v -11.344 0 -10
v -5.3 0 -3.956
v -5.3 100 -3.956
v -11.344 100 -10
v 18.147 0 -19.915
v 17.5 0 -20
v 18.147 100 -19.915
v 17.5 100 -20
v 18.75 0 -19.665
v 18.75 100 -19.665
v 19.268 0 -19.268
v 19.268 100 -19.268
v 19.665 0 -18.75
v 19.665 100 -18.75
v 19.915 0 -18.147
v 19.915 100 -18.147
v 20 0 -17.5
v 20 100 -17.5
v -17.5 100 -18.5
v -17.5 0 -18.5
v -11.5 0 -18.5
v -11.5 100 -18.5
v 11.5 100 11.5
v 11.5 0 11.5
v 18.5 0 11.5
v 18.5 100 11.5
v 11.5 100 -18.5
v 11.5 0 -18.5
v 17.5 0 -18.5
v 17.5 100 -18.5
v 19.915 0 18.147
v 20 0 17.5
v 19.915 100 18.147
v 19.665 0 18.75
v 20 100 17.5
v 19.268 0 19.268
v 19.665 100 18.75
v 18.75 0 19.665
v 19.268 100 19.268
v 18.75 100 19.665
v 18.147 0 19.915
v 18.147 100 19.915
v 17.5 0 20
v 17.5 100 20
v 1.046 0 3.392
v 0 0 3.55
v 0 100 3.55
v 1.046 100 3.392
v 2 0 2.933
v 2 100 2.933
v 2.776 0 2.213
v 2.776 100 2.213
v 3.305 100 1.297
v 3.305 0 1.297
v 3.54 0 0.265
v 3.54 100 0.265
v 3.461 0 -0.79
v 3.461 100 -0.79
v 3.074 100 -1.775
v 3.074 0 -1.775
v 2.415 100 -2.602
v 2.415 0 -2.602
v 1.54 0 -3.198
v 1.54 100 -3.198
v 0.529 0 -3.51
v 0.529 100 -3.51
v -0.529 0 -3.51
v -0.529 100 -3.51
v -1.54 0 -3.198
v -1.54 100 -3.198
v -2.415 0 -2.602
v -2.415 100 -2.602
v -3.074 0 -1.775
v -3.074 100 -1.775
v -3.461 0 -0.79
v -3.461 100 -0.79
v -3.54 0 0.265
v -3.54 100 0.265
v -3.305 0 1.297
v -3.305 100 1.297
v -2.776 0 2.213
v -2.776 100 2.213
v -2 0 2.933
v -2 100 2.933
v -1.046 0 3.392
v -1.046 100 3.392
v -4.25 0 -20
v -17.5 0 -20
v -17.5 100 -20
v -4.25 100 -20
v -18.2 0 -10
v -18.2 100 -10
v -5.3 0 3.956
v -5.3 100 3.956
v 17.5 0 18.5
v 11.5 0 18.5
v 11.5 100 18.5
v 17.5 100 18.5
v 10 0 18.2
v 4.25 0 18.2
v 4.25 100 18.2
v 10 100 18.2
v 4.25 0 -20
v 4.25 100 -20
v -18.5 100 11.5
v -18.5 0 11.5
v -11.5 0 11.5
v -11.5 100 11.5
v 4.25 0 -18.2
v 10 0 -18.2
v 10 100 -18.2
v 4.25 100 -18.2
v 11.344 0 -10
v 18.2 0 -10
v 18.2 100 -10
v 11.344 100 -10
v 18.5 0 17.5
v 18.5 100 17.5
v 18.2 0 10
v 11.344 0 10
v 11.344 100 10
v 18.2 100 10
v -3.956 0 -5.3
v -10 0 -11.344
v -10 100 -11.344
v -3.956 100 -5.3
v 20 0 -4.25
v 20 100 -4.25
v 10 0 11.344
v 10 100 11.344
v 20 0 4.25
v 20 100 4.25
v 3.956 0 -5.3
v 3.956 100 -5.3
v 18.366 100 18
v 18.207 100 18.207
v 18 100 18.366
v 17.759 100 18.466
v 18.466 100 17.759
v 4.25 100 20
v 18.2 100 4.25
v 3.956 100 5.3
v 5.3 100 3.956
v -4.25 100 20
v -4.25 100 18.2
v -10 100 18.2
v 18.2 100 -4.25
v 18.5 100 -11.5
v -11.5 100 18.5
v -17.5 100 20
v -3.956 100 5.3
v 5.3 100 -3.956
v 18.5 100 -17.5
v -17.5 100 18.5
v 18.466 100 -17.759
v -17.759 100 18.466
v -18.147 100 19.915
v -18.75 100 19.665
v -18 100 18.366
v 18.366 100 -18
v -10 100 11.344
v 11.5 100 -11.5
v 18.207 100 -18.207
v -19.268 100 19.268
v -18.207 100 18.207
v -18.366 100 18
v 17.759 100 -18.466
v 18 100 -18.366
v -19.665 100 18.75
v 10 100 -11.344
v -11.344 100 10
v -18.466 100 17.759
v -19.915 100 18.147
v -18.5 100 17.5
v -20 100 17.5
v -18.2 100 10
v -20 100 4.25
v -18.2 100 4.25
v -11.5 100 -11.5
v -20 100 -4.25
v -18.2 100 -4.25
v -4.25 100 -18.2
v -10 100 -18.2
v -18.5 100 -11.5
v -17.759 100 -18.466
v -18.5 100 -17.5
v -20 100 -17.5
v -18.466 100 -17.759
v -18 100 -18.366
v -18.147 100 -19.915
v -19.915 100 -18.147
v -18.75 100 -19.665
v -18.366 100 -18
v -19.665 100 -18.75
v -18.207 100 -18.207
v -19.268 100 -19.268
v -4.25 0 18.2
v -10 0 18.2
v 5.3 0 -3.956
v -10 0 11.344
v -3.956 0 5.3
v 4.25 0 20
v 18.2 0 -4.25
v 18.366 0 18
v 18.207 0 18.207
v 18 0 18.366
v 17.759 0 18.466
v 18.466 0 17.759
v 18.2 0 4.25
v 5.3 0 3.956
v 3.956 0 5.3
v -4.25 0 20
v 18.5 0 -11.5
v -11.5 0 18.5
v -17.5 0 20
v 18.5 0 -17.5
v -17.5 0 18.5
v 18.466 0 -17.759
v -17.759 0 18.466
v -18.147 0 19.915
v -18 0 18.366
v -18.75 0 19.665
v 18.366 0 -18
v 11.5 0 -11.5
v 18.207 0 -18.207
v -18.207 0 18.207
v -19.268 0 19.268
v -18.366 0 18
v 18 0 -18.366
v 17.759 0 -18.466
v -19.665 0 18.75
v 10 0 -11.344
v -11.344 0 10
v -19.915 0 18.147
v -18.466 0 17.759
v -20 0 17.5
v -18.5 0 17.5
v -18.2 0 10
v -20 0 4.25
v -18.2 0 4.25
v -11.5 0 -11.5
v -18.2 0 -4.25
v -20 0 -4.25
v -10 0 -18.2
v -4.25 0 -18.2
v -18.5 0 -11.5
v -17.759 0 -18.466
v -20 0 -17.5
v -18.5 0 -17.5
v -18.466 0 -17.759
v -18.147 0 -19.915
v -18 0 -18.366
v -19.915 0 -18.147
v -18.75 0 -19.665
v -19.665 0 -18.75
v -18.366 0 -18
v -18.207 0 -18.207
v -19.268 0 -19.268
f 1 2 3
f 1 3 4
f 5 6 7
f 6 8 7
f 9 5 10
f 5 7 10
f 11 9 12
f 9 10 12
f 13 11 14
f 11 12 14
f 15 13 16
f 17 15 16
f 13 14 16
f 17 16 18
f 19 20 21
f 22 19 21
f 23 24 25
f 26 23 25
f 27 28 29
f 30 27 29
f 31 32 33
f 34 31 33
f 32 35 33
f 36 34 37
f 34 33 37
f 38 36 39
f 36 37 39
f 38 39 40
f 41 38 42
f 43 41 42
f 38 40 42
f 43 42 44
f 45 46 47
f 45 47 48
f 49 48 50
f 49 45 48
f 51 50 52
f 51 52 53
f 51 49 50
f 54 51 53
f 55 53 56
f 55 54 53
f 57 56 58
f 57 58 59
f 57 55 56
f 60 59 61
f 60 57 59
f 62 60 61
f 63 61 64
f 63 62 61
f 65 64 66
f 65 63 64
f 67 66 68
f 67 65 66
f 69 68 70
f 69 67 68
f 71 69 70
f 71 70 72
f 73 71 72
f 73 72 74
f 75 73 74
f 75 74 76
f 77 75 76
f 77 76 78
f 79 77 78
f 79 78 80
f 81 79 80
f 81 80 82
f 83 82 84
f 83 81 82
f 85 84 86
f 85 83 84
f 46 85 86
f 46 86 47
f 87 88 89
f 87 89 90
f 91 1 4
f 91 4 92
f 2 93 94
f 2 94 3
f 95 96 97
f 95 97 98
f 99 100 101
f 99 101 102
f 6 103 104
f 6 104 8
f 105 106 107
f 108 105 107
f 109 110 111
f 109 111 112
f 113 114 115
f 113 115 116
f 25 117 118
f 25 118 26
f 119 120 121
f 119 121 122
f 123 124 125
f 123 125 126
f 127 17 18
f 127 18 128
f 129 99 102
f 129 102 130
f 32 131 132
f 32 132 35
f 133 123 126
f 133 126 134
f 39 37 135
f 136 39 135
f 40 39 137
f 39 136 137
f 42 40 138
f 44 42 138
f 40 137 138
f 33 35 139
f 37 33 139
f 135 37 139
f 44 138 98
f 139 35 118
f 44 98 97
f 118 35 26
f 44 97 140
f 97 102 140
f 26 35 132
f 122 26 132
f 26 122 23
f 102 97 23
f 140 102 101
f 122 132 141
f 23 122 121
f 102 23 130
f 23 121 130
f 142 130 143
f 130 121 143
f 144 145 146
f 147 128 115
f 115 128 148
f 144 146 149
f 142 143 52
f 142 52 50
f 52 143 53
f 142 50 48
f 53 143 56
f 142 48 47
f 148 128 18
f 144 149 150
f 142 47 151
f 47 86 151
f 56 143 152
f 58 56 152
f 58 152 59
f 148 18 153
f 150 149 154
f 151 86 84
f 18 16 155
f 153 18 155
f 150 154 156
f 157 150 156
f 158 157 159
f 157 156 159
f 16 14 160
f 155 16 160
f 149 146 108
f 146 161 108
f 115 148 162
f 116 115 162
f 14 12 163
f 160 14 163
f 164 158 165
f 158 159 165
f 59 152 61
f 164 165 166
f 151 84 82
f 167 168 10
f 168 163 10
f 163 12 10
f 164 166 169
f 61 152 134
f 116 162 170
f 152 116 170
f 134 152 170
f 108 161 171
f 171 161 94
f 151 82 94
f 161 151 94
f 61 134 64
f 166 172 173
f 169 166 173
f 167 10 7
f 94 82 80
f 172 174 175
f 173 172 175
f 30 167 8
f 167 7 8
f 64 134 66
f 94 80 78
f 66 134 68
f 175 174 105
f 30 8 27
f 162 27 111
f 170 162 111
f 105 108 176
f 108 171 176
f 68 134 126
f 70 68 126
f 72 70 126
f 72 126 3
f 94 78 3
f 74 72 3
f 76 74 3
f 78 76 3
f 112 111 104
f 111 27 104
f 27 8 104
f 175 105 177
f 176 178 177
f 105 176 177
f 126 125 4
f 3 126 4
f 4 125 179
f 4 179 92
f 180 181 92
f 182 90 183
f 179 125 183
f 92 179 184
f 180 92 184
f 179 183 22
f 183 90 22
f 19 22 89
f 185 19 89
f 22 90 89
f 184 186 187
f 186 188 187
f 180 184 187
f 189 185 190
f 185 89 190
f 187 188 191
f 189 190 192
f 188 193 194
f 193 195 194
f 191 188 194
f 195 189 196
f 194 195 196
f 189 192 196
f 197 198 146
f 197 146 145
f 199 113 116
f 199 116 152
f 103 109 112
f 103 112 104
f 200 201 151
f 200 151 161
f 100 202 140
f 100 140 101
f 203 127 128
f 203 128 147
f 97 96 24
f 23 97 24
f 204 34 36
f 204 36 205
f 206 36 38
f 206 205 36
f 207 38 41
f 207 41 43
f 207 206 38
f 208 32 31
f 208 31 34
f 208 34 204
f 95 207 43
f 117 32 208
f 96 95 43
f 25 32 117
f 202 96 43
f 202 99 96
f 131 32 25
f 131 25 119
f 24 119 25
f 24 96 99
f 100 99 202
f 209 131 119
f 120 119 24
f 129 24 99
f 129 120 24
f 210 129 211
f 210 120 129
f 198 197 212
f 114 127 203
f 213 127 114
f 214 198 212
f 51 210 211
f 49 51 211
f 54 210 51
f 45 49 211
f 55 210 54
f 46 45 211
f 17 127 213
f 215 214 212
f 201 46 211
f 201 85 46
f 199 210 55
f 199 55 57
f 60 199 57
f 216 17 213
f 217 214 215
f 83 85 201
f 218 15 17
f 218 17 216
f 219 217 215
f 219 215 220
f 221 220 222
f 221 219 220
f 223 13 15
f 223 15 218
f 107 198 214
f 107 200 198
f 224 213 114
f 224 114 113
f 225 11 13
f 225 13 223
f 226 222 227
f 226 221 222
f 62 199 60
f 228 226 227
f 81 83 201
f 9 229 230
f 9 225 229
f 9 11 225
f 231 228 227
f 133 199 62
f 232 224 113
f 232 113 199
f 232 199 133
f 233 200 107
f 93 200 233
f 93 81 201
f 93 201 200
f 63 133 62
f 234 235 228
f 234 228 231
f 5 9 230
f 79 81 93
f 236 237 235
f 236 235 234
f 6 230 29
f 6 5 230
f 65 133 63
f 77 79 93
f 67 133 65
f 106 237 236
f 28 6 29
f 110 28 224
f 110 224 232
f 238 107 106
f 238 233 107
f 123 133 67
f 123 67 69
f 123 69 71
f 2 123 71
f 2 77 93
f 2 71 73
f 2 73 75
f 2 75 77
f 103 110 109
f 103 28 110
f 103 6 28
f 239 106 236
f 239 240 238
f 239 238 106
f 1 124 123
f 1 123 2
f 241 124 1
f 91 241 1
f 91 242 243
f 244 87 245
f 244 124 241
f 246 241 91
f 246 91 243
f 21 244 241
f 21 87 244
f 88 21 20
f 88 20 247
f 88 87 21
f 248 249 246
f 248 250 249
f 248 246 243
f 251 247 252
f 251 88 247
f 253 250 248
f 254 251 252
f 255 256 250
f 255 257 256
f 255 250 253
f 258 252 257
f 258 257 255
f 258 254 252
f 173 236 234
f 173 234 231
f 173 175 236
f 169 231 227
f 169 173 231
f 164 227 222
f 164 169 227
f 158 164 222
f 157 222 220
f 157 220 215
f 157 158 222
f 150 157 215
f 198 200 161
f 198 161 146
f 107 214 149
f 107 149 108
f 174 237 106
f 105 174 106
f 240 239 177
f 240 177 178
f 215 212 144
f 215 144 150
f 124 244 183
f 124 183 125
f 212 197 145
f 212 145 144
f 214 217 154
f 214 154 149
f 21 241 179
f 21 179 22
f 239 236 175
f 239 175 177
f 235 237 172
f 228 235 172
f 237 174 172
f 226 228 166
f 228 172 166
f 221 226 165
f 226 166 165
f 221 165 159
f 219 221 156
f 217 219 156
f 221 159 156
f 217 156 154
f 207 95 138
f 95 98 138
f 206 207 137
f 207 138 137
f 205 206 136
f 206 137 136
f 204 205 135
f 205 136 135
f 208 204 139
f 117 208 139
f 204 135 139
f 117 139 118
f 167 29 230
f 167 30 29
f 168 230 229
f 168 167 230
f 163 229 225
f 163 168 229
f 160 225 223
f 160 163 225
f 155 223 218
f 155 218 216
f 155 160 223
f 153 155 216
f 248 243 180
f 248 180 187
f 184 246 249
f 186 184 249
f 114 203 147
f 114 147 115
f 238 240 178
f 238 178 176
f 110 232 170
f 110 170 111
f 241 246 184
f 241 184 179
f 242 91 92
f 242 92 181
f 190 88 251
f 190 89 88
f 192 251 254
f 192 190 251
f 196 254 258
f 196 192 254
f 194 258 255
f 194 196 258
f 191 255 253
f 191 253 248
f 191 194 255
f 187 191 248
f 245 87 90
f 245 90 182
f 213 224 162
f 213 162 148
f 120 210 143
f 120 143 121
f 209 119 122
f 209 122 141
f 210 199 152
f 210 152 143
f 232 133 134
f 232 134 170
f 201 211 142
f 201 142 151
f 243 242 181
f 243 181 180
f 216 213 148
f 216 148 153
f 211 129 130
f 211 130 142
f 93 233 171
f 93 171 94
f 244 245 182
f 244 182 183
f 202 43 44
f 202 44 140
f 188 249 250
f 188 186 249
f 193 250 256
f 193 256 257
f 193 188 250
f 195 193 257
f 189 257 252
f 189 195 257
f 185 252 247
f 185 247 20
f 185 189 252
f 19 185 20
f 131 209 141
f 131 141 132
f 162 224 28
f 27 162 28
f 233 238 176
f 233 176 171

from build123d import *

# Parameters (mm, degrees)
SKETCH_1_R      = 3.55
SKETCH_1_W      = 7
SKETCH_1_H      = 7
EXTRUDE_1_DEPTH = 100
FILLET_1_R      = 1
FILLET_2_R      = 2.5


with BuildPart() as part:
    # 草图1 → 凸台-拉伸1 (new body)
    with BuildSketch(Plane(origin=(0, 0, 0), x_dir=(1, 0, 0), z_dir=(0, 1, 0))):
        Polygon((-20, 20), (-4.25, 20), (-4.25, 18.2), (-10, 18.2), (-10, 11.343502884), (-3.956497116, 5.3), (3.956497116, 5.3), (10, 11.343502884), (10, 18.2), (4.25, 18.2), (4.25, 20), (20, 20), (20, 4.25), (18.2, 4.25), (18.2, 10), (11.343502884, 10), (5.3, 3.956497116), (5.3, -3.956497116), (11.343502884, -10), (18.2, -10), (18.2, -4.25), (20, -4.25), (20, -20), (4.25, -20), (4.25, -18.2), (10, -18.2), (10, -11.343502884), (3.956497116, -5.3), (-3.956497116, -5.3), (-10, -11.343502884), (-10, -18.2), (-4.25, -18.2), (-4.25, -20), (-20, -20), (-20, -4.25), (-18.2, -4.25), (-18.2, -10), (-11.343502884, -10), (-5.3, -3.956497116), (-5.3, 3.956497116), (-11.343502884, 10), (-18.2, 10), (-18.2, 4.25), (-20, 4.25), align=None)
        with Locations(Location((0, 0, 0), (0, 0, 270))):
            Circle(SKETCH_1_R, mode=Mode.SUBTRACT)
        with Locations((-15, 15)):
            Rectangle(SKETCH_1_W, SKETCH_1_H, mode=Mode.SUBTRACT)
        with Locations((15, 15)):
            Rectangle(SKETCH_1_W, SKETCH_1_H, mode=Mode.SUBTRACT)
        with Locations((15, -15)):
            Rectangle(SKETCH_1_W, SKETCH_1_H, mode=Mode.SUBTRACT)
        with Locations((-15, -15)):
            Rectangle(SKETCH_1_W, SKETCH_1_H, mode=Mode.SUBTRACT)
    extrude(amount=EXTRUDE_1_DEPTH)

    # 圆角1
    fillet_1_edges = [part.edges().sort_by_distance(p)[0] for p in [
        (-18.5, 50, -18.5),
        (18.5, 50, -18.5),
        (18.5, 50, 18.5),
        (-18.5, 50, 18.5),
    ]]
    fillet(fillet_1_edges, radius=FILLET_1_R)

    # 圆角2
    fillet_2_edges = [part.edges().sort_by_distance(p)[0] for p in [
        (-20, 50, -20),
        (20, 50, -20),
        (20, 50, 20),
        (-20, 50, 20),
    ]]
    fillet(fillet_2_edges, radius=FILLET_2_R)


solid = part.part
